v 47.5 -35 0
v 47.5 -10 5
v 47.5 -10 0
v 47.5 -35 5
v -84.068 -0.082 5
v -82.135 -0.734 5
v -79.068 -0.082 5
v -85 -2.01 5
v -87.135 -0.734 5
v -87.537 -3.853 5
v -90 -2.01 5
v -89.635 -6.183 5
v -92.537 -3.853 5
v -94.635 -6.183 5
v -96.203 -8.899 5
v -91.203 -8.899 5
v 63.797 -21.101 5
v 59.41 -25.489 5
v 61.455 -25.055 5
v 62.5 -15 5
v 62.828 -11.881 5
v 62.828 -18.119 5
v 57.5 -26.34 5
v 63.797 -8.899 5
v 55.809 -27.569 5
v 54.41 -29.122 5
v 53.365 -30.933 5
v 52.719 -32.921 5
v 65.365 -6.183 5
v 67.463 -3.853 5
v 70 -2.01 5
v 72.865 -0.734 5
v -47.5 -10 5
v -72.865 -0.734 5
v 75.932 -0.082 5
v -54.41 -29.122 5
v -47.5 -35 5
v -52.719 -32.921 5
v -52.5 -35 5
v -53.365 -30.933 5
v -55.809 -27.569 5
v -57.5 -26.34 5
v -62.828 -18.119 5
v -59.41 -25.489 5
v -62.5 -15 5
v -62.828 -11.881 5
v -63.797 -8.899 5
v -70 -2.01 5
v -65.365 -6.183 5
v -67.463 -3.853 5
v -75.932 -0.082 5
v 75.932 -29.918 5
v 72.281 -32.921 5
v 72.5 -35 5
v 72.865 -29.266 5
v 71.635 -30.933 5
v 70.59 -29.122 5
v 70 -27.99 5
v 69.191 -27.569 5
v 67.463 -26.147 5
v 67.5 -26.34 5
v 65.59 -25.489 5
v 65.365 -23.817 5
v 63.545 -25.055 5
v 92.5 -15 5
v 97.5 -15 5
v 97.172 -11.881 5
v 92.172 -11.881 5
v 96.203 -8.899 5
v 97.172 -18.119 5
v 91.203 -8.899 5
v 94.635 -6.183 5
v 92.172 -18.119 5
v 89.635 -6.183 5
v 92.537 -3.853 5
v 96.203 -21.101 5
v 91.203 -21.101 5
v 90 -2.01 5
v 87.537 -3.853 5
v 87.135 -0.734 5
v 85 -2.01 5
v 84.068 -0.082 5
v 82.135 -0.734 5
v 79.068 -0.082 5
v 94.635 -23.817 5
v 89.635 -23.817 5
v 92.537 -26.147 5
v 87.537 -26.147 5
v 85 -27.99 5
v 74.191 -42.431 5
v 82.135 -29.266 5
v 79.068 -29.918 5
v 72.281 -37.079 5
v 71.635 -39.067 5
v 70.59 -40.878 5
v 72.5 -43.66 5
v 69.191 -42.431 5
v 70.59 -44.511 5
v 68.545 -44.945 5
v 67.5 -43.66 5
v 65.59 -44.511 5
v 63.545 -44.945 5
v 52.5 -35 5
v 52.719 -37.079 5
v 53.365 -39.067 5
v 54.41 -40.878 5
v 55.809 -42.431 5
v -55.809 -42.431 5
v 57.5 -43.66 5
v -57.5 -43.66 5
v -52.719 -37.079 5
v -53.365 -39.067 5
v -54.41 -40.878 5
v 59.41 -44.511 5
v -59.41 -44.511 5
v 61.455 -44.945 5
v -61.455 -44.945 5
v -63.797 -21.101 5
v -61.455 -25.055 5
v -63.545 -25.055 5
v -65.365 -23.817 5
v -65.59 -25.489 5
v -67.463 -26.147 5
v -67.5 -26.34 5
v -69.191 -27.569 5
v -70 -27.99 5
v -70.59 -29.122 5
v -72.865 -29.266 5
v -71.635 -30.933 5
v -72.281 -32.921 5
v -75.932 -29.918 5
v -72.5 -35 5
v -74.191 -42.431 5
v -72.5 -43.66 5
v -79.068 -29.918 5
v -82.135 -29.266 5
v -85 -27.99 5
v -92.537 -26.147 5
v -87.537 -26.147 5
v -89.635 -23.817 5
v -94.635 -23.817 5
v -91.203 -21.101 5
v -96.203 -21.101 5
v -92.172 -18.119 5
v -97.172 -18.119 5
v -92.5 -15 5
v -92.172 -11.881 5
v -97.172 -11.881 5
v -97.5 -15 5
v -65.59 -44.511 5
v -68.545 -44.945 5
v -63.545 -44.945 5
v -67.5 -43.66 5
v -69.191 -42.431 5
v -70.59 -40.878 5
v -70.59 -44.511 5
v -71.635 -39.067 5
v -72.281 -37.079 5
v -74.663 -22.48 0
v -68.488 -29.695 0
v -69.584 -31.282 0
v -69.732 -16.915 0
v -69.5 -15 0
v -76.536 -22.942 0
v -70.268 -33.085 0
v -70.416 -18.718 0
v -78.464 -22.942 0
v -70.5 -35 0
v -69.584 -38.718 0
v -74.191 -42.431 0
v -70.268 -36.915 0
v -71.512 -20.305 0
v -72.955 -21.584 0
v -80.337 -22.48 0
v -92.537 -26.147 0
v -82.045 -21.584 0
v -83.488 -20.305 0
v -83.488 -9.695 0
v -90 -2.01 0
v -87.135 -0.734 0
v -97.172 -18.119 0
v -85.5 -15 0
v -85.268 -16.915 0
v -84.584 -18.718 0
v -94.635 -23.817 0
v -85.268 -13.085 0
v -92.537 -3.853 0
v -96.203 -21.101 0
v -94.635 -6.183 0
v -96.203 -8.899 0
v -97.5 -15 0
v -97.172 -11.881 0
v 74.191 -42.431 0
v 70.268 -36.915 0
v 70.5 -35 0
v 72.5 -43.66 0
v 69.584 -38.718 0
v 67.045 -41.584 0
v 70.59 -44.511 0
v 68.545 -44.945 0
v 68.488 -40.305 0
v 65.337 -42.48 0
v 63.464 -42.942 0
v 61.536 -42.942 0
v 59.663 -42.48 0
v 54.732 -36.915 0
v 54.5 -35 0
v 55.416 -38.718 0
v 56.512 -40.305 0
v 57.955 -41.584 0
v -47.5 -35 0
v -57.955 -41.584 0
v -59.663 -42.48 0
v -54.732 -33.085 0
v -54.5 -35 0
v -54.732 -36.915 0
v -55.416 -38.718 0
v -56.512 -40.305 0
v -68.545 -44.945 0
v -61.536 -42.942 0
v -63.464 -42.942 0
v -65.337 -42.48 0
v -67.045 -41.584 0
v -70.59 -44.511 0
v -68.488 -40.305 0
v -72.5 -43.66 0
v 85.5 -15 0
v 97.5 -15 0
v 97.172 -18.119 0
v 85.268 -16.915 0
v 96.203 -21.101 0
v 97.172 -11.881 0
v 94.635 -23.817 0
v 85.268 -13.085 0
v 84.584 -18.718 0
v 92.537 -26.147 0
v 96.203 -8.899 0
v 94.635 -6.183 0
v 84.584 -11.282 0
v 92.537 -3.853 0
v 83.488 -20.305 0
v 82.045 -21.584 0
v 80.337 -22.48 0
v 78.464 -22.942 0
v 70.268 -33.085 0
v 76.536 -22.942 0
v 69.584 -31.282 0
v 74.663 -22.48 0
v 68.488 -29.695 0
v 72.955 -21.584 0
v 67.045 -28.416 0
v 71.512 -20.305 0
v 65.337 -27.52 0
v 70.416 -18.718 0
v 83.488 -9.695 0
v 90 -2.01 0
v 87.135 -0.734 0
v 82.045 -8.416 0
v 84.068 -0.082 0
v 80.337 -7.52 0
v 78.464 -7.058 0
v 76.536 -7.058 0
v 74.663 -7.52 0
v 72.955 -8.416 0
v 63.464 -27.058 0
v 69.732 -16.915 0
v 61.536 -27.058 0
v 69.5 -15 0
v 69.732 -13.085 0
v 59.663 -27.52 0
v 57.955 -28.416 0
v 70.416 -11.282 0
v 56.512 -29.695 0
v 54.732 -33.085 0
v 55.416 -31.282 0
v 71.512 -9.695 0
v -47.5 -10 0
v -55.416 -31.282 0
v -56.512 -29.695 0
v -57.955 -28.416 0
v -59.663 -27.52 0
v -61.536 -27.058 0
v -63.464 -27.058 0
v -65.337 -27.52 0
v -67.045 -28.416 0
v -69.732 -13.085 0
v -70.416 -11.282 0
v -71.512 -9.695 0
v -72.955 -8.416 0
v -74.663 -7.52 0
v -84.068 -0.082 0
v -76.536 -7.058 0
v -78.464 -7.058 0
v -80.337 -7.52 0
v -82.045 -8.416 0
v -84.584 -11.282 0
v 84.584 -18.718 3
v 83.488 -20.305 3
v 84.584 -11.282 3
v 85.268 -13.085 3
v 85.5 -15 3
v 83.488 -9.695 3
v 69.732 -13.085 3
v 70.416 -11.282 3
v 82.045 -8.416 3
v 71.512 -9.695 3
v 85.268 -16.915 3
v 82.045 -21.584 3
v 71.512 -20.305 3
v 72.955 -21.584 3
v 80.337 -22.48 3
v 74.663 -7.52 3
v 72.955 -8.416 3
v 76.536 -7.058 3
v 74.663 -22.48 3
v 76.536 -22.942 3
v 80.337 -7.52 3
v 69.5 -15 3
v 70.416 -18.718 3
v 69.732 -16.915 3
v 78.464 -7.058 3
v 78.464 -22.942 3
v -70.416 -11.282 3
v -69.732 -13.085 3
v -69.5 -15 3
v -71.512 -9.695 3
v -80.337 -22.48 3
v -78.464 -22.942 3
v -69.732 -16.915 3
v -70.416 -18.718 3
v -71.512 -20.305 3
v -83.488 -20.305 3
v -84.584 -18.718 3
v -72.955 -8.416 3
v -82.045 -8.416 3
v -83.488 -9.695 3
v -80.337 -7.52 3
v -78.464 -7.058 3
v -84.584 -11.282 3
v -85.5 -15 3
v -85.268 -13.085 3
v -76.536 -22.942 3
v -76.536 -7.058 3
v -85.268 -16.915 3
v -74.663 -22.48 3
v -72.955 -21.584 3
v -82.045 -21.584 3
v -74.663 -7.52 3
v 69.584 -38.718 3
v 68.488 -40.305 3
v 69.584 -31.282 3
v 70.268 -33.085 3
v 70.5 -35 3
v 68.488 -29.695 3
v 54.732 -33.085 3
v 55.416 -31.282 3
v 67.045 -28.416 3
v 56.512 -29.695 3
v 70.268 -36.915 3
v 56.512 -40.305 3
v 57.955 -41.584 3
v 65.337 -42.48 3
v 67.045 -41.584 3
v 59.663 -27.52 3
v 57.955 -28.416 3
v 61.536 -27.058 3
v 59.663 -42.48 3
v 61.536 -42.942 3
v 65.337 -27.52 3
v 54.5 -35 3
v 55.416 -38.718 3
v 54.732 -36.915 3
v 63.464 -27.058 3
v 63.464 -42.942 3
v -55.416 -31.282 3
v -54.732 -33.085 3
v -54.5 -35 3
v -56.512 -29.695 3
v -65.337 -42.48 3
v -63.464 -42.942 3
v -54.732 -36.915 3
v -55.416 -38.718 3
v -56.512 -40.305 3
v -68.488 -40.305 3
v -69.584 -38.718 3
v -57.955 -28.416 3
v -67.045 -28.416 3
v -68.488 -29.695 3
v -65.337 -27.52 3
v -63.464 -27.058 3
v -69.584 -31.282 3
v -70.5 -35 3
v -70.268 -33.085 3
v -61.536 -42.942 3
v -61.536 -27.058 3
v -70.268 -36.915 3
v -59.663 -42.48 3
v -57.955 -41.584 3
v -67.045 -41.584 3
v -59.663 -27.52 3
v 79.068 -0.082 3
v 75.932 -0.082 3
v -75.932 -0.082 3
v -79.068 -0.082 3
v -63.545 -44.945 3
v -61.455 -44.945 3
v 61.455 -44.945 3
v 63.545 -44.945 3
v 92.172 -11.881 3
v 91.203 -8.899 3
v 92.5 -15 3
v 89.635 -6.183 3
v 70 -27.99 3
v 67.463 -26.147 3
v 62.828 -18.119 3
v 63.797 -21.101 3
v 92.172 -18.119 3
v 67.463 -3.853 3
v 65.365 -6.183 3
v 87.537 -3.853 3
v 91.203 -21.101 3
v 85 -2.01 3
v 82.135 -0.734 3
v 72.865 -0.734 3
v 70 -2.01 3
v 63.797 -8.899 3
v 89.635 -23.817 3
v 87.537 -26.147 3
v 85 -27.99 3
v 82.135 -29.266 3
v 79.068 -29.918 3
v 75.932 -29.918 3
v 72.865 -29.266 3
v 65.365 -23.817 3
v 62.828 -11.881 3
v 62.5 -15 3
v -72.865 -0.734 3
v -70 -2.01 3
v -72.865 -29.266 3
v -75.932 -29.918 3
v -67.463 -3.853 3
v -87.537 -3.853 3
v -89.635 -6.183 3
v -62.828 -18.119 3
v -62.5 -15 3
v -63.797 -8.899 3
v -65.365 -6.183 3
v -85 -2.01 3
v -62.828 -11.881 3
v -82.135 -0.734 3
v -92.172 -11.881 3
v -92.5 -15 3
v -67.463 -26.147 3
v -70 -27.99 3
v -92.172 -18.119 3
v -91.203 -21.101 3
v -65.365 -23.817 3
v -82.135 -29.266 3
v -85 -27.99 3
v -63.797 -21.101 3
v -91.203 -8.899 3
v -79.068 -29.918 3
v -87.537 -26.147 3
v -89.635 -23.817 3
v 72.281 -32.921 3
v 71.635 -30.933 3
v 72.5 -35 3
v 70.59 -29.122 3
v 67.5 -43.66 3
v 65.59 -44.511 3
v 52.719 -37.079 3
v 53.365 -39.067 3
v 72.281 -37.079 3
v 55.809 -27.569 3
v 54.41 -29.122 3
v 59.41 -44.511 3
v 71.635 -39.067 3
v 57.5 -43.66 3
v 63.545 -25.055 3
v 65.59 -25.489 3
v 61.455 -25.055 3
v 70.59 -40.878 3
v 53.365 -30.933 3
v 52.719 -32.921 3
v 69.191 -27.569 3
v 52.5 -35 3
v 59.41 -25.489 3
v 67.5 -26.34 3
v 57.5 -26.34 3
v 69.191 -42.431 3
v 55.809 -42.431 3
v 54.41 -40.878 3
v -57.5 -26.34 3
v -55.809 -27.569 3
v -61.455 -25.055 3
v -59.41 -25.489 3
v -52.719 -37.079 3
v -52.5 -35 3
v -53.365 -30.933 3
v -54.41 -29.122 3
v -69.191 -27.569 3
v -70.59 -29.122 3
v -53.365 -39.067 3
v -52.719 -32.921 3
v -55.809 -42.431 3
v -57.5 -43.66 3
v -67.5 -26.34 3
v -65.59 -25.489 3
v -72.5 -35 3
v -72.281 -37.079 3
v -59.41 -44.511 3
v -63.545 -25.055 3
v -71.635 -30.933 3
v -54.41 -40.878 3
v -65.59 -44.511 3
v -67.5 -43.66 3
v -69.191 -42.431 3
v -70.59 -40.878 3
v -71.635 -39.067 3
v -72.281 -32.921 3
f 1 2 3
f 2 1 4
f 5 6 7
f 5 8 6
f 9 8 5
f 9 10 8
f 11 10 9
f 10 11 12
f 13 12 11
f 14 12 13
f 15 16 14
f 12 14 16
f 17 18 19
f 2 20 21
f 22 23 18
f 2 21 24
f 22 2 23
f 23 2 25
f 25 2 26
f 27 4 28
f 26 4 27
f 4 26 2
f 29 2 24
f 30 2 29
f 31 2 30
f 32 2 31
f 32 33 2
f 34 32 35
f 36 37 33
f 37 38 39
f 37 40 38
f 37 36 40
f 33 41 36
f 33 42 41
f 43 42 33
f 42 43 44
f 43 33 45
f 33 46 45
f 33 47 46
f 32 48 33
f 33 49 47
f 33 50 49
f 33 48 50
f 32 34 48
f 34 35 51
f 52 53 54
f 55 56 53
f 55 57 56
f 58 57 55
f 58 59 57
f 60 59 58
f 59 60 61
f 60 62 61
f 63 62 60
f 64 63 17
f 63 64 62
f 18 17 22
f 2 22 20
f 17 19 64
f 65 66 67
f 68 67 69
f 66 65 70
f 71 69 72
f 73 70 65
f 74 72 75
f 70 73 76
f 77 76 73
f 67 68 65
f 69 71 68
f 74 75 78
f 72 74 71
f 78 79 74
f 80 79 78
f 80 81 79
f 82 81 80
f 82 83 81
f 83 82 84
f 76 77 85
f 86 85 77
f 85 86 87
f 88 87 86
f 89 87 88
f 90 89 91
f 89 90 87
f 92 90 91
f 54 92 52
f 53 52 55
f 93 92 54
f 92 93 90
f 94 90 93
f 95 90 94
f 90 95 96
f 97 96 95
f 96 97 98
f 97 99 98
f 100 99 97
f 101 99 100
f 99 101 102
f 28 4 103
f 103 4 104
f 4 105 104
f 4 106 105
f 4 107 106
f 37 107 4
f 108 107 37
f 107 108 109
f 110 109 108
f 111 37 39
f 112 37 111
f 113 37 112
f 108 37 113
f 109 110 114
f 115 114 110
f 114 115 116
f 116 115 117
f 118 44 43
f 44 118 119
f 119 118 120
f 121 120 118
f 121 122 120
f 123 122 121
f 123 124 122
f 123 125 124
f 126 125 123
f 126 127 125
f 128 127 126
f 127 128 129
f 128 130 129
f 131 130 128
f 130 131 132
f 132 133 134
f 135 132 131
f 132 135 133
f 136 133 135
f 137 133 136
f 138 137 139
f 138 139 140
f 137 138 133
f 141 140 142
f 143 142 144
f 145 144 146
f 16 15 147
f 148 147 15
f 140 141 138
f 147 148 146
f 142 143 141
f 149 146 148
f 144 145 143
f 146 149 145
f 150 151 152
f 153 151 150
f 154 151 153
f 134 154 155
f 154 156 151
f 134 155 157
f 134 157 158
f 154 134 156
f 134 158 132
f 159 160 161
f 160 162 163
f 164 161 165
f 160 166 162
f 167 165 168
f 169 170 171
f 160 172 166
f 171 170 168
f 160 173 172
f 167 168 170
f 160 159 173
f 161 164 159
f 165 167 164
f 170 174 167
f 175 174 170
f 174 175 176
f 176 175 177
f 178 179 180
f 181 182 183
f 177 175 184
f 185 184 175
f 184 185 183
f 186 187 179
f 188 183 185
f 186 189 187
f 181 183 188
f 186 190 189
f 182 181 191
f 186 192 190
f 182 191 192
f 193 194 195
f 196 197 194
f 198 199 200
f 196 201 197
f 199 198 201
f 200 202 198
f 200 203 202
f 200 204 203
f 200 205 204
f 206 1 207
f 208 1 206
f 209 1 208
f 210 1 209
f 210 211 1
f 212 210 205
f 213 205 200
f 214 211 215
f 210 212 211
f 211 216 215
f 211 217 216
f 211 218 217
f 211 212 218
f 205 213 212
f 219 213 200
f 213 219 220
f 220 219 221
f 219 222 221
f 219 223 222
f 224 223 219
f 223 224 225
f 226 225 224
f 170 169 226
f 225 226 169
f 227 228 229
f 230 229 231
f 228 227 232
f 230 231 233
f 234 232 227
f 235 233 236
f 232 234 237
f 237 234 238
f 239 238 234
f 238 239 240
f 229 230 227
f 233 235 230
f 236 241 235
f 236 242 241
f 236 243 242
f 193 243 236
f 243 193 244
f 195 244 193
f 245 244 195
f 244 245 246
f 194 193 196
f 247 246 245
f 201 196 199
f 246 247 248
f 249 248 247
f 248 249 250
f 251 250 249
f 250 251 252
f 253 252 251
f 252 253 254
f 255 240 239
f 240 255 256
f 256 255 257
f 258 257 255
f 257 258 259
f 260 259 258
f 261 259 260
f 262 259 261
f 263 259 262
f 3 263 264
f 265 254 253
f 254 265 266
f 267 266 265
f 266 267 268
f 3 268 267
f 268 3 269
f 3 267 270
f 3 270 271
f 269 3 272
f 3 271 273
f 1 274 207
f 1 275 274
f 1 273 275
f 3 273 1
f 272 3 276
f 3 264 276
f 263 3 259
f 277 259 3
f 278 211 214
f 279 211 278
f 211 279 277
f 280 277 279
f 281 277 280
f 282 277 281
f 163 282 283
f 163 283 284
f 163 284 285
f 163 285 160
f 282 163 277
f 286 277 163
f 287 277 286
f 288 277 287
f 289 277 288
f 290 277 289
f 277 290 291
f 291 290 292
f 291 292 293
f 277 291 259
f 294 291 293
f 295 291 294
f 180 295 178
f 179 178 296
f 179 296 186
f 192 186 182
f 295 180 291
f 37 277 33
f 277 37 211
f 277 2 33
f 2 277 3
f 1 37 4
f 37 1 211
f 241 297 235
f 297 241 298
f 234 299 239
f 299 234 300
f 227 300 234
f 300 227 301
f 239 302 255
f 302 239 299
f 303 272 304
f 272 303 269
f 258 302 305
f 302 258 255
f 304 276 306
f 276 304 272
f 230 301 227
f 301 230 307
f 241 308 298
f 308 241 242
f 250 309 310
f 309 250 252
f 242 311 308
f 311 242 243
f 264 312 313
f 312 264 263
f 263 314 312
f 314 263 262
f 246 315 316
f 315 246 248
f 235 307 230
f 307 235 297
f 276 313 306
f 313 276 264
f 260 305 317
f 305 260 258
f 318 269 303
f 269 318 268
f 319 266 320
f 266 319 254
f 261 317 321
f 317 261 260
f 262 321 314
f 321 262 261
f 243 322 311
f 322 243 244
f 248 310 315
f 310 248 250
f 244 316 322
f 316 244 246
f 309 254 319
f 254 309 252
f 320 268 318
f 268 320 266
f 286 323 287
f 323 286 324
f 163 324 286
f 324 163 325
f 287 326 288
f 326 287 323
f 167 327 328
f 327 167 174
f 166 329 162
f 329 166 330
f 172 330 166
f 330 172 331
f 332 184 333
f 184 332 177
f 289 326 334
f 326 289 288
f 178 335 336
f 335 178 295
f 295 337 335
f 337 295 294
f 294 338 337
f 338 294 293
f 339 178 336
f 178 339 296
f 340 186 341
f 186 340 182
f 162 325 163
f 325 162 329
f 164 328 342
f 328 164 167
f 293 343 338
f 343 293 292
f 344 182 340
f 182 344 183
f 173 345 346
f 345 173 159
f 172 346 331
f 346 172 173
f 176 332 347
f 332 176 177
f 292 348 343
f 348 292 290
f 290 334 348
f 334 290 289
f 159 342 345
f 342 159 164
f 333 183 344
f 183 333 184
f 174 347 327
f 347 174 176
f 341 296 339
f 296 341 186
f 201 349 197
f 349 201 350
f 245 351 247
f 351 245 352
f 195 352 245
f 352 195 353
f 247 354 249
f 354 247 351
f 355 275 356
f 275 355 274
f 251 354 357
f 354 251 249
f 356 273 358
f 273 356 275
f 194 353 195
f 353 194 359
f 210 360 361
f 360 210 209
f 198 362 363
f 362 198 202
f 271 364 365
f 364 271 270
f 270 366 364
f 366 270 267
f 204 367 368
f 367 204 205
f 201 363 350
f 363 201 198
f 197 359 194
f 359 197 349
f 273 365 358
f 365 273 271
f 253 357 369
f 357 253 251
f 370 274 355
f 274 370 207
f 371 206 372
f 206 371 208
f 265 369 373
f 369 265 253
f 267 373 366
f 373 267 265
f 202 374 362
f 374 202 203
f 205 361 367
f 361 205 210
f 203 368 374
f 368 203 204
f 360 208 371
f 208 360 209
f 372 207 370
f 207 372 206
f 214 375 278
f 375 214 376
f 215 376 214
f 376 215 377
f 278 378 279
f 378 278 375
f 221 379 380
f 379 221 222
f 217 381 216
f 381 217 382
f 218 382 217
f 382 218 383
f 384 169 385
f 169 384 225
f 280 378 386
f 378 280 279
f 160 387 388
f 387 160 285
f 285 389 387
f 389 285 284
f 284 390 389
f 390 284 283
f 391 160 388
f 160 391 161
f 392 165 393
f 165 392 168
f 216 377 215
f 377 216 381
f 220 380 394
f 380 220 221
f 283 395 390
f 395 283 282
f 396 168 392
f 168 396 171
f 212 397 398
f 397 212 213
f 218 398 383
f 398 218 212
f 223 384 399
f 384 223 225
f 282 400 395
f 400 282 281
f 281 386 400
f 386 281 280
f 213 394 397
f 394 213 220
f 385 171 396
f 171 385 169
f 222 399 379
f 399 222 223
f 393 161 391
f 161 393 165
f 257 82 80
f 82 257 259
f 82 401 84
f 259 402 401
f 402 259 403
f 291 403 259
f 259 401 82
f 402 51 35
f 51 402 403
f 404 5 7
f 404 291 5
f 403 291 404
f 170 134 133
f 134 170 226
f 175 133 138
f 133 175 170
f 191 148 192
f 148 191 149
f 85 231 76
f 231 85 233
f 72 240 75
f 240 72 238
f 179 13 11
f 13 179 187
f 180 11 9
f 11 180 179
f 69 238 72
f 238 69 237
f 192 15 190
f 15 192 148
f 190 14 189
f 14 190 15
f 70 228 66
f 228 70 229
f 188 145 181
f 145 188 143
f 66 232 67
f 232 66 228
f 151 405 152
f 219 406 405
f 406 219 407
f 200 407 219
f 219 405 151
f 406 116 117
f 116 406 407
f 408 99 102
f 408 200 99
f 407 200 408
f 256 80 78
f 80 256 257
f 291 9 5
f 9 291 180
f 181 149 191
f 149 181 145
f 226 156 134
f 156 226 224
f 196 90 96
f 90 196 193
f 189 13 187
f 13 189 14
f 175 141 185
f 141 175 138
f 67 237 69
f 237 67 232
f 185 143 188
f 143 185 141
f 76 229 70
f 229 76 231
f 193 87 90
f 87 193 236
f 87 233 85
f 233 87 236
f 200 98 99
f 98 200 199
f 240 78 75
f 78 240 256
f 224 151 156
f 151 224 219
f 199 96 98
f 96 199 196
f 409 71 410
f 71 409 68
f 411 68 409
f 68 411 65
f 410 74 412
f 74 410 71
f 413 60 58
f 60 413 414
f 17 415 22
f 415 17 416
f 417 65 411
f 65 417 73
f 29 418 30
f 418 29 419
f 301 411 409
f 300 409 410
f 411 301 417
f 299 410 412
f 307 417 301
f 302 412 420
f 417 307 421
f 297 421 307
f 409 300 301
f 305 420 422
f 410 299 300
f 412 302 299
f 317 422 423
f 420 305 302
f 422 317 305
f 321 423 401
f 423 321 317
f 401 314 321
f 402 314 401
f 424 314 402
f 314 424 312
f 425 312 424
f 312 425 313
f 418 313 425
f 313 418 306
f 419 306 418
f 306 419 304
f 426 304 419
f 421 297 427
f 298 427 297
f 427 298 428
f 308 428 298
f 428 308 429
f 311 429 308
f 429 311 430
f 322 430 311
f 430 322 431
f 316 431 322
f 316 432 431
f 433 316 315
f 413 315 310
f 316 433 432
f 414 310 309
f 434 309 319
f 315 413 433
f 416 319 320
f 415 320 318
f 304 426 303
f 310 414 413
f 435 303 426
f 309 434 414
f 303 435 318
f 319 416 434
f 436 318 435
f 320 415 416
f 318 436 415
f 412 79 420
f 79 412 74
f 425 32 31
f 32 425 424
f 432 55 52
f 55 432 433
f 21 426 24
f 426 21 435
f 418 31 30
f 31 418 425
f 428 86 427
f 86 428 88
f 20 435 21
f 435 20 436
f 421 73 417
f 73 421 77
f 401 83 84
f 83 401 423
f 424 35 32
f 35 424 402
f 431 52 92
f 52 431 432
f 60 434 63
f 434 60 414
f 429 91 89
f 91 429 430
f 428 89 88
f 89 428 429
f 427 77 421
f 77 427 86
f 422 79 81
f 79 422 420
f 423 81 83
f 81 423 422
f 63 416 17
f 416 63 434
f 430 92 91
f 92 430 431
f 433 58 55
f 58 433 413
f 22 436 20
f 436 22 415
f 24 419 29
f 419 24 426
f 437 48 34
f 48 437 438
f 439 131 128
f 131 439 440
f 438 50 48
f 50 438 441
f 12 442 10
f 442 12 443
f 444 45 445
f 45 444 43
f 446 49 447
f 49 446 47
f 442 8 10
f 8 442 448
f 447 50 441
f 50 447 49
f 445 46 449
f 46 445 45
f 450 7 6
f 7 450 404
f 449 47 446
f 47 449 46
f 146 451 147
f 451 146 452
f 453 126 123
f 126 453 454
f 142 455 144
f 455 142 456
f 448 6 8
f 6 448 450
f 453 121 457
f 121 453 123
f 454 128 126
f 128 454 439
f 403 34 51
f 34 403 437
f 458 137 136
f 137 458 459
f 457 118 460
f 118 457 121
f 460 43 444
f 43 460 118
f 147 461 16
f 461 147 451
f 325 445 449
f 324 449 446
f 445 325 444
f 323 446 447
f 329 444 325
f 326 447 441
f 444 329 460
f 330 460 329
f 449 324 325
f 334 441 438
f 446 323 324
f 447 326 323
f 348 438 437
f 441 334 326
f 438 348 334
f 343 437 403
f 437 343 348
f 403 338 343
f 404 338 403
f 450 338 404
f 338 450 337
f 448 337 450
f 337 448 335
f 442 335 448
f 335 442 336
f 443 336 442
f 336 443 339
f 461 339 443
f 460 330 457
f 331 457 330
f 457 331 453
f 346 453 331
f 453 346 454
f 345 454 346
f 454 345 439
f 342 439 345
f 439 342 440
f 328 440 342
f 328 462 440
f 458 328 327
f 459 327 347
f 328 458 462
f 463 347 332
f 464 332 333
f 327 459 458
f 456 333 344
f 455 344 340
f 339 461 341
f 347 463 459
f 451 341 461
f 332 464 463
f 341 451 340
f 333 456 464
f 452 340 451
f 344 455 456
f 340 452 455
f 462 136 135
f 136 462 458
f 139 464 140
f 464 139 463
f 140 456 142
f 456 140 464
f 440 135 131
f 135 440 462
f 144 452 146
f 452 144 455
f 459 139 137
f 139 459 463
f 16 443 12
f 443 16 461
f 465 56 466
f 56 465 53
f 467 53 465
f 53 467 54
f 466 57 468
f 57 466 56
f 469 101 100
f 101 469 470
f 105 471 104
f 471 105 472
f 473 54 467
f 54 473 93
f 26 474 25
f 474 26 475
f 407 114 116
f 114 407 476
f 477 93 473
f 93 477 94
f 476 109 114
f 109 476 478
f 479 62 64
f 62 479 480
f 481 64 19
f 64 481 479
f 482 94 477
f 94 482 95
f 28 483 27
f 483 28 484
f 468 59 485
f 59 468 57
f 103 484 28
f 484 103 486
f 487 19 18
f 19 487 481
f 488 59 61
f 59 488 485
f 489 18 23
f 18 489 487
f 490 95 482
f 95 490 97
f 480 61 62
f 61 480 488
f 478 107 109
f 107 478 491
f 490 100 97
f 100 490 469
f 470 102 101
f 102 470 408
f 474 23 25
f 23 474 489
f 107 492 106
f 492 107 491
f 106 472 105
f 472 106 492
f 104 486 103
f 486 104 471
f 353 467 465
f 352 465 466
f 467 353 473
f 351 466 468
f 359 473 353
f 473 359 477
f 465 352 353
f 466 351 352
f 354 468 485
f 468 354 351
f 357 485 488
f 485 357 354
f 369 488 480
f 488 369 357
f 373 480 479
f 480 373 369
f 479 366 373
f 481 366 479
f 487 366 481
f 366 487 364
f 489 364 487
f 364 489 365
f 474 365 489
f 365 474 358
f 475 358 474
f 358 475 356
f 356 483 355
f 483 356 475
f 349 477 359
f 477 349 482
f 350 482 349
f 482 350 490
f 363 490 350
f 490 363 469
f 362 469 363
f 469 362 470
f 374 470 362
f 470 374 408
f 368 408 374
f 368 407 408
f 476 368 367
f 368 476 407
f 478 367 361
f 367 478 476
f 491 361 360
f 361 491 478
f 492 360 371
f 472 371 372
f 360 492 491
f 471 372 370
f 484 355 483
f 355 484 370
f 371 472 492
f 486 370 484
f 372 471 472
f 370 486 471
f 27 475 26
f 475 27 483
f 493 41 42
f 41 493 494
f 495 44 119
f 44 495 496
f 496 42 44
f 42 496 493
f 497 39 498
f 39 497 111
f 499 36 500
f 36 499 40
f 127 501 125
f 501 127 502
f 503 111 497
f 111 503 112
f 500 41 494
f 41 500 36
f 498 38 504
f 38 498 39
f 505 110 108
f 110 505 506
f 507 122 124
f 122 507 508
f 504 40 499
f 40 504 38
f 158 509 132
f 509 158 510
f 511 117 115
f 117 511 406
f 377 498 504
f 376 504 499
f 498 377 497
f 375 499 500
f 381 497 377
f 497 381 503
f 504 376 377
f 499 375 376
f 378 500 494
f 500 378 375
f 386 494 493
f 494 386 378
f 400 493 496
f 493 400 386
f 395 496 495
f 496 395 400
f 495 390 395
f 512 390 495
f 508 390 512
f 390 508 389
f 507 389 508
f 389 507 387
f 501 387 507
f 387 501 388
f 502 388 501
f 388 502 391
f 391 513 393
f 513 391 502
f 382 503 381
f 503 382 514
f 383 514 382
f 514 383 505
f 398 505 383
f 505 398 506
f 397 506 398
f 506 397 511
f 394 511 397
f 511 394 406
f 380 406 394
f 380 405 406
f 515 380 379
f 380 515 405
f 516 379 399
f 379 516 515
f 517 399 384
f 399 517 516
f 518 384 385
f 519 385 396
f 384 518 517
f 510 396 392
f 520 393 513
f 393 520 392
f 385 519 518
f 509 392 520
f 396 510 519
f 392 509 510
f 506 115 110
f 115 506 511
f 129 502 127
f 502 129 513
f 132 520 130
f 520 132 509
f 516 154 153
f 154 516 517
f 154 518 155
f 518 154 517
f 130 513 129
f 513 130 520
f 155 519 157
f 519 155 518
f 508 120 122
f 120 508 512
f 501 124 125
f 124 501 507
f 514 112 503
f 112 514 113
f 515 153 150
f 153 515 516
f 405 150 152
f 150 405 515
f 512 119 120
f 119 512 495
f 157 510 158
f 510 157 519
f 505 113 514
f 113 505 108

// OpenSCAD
// Roller Project Part #1 Front Bracket

PlateThickness = 5;
roller_depression = 2;

UpperRollerRadius = 15;
LowerRollerRadius = 10;

UpperRollerLip = 5;
LowerRollerLip = 5;

InnerHoleWidth = 95;
InnerHoleHeight= 25;

TopGapHeight = 10;
BottomGapHeight = 10;

UpperRollerOutset = 30;
LowerRollerOutset = 15;

Upper_bearing_r = 8;
Lower_bearing_r =8;

C_total_height = InnerHoleHeight + TopGapHeight + BottomGapHeight;


main();

module main(){
	difference(){
		hulled_part_a();
		holes();
		translate( v = [InnerHoleWidth/2 + UpperRollerOutset,-UpperRollerRadius,PlateThickness-roller_depression]){
			cylinder(h=roller_depression, r=UpperRollerRadius);
		}
		translate( v = [-(InnerHoleWidth/2 + UpperRollerOutset),-UpperRollerRadius,PlateThickness-roller_depression]){
			cylinder(h=roller_depression, r=UpperRollerRadius);
		}	
		translate( v = [InnerHoleWidth/2 + LowerRollerOutset,-C_total_height+LowerRollerRadius,PlateThickness-roller_depression]){
			cylinder(h=roller_depression, r=LowerRollerRadius);
		}
		translate( v = [-(InnerHoleWidth/2 + LowerRollerOutset),-C_total_height+LowerRollerRadius,PlateThickness-roller_depression]){
			cylinder(h=roller_depression, r=LowerRollerRadius);
		}		
	}

}


module part1a(side,radius,x,y){
	translate(v = [side*x, y,0]){
		cylinder(h = PlateThickness, r = radius);
	}
}

module hulled_part_a(){
	hull(){
		part1a(1,UpperRollerRadius,InnerHoleWidth/2 + UpperRollerOutset+UpperRollerLip,-UpperRollerRadius);
		part1a(-1,UpperRollerRadius,InnerHoleWidth/2 + UpperRollerOutset+UpperRollerLip,-UpperRollerRadius);

		part1a(1,LowerRollerRadius,InnerHoleWidth/2 + LowerRollerOutset+LowerRollerLip,
		-(InnerHoleHeight+TopGapHeight+BottomGapHeight-LowerRollerRadius));
		part1a(-1,LowerRollerRadius,InnerHoleWidth/2 + LowerRollerOutset+LowerRollerLip,
		-(InnerHoleHeight+TopGapHeight+BottomGapHeight-LowerRollerRadius));
	}
}

module holes(){
	translate( v= [-InnerHoleWidth/2,-InnerHoleHeight-TopGapHeight]){
		cube(size=[InnerHoleWidth,InnerHoleHeight,PlateThickness]);
	}
	translate(v=[InnerHoleWidth/2+UpperRollerOutset,-UpperRollerRadius,0]){
		cylinder(h = PlateThickness, r = Upper_bearing_r);
	}
	translate(v=[-(InnerHoleWidth/2+UpperRollerOutset),-UpperRollerRadius,0]){
		cylinder(h = PlateThickness, r = Upper_bearing_r);
	}
	translate(v=[InnerHoleWidth/2+LowerRollerOutset,-C_total_height+LowerRollerRadius,0]){
		cylinder(h = PlateThickness, r = Lower_bearing_r);
	}
	translate(v=[-(InnerHoleWidth/2+LowerRollerOutset),-C_total_height+LowerRollerRadius,0]){
		cylinder(h = PlateThickness, r = Lower_bearing_r);
	}
}
